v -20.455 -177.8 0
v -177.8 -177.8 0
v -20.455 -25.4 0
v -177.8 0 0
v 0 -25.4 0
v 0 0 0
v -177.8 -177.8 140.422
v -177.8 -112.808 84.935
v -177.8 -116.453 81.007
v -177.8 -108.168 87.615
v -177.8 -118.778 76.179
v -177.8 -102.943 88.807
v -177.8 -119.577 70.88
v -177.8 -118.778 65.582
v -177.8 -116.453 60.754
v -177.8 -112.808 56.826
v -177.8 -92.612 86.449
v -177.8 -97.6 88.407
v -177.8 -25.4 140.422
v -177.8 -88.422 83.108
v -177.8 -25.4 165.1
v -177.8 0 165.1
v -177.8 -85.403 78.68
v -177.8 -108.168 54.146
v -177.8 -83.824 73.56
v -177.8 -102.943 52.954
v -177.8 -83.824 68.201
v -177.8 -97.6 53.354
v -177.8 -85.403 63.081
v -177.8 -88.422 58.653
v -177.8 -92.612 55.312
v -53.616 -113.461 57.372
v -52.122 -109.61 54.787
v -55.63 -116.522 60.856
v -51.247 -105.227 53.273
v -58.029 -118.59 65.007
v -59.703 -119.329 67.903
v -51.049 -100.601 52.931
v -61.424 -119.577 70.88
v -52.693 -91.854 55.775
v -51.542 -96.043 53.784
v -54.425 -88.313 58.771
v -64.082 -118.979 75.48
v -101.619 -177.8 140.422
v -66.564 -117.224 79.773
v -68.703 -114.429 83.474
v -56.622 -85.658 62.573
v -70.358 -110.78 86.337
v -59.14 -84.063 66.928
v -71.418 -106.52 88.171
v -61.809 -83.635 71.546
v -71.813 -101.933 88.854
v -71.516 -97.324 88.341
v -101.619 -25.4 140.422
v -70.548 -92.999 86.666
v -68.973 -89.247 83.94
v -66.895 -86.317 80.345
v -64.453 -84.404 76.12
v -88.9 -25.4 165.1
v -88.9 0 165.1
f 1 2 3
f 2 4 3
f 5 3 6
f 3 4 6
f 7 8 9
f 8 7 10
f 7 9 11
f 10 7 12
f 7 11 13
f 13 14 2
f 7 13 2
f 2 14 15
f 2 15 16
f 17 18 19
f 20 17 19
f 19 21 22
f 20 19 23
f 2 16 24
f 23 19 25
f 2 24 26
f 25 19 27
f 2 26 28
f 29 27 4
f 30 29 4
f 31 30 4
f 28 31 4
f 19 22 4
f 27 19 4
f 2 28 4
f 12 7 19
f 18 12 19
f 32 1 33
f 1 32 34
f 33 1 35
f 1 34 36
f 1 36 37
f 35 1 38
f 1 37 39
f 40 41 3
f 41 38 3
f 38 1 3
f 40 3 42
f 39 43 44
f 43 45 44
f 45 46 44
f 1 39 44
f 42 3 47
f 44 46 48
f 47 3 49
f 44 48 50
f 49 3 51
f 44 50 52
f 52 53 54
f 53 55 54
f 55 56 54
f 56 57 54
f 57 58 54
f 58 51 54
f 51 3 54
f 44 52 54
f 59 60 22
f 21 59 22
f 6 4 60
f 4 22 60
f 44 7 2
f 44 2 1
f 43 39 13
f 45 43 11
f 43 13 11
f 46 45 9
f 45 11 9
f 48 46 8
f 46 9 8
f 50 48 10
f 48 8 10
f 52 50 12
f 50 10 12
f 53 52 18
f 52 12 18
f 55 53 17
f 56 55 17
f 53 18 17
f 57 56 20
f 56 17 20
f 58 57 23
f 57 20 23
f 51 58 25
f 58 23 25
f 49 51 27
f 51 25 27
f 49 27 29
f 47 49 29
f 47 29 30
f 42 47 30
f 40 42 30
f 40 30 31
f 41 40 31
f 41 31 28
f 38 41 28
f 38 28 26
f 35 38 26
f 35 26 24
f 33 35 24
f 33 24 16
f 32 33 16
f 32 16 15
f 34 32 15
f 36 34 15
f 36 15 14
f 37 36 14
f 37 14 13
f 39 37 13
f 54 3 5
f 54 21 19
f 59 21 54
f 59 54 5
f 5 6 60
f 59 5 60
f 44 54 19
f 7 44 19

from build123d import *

# Parameters (mm, degrees)
F1_DEPTH = 25.4
F3_DEPTH = 152.4
F4_R     = 17.976868
F5_DEPTH = 177.801


with BuildPart() as f1:
    # F0 (on Front) → F1 (new body)
    with BuildSketch(Plane.XZ):
        Polygon((-177.8, 0), (0, 0), (-88.9, 165.1), (-177.8, 165.1), align=None)
    extrude(amount=F1_DEPTH)

    # F2 (on face) → F3 (join)
    with BuildSketch(Plane.XZ.offset(25.4)):
        Polygon((-177.8, 140.421584), (-177.8, 0), (-20.454695, 0), (-101.619244, 140.421584), align=None)
    extrude(amount=F3_DEPTH)

    # F4 (on face) → F5 (cut, through all)
    with BuildSketch(Plane(origin=(-177.8, 0, 0), x_dir=(0, -1, 0), z_dir=(-1, 0, 0))):
        with Locations((101.6, 70.880428)):
            Circle(F4_R)
    extrude(amount=-F5_DEPTH, mode=Mode.SUBTRACT)


solid = f1.part
